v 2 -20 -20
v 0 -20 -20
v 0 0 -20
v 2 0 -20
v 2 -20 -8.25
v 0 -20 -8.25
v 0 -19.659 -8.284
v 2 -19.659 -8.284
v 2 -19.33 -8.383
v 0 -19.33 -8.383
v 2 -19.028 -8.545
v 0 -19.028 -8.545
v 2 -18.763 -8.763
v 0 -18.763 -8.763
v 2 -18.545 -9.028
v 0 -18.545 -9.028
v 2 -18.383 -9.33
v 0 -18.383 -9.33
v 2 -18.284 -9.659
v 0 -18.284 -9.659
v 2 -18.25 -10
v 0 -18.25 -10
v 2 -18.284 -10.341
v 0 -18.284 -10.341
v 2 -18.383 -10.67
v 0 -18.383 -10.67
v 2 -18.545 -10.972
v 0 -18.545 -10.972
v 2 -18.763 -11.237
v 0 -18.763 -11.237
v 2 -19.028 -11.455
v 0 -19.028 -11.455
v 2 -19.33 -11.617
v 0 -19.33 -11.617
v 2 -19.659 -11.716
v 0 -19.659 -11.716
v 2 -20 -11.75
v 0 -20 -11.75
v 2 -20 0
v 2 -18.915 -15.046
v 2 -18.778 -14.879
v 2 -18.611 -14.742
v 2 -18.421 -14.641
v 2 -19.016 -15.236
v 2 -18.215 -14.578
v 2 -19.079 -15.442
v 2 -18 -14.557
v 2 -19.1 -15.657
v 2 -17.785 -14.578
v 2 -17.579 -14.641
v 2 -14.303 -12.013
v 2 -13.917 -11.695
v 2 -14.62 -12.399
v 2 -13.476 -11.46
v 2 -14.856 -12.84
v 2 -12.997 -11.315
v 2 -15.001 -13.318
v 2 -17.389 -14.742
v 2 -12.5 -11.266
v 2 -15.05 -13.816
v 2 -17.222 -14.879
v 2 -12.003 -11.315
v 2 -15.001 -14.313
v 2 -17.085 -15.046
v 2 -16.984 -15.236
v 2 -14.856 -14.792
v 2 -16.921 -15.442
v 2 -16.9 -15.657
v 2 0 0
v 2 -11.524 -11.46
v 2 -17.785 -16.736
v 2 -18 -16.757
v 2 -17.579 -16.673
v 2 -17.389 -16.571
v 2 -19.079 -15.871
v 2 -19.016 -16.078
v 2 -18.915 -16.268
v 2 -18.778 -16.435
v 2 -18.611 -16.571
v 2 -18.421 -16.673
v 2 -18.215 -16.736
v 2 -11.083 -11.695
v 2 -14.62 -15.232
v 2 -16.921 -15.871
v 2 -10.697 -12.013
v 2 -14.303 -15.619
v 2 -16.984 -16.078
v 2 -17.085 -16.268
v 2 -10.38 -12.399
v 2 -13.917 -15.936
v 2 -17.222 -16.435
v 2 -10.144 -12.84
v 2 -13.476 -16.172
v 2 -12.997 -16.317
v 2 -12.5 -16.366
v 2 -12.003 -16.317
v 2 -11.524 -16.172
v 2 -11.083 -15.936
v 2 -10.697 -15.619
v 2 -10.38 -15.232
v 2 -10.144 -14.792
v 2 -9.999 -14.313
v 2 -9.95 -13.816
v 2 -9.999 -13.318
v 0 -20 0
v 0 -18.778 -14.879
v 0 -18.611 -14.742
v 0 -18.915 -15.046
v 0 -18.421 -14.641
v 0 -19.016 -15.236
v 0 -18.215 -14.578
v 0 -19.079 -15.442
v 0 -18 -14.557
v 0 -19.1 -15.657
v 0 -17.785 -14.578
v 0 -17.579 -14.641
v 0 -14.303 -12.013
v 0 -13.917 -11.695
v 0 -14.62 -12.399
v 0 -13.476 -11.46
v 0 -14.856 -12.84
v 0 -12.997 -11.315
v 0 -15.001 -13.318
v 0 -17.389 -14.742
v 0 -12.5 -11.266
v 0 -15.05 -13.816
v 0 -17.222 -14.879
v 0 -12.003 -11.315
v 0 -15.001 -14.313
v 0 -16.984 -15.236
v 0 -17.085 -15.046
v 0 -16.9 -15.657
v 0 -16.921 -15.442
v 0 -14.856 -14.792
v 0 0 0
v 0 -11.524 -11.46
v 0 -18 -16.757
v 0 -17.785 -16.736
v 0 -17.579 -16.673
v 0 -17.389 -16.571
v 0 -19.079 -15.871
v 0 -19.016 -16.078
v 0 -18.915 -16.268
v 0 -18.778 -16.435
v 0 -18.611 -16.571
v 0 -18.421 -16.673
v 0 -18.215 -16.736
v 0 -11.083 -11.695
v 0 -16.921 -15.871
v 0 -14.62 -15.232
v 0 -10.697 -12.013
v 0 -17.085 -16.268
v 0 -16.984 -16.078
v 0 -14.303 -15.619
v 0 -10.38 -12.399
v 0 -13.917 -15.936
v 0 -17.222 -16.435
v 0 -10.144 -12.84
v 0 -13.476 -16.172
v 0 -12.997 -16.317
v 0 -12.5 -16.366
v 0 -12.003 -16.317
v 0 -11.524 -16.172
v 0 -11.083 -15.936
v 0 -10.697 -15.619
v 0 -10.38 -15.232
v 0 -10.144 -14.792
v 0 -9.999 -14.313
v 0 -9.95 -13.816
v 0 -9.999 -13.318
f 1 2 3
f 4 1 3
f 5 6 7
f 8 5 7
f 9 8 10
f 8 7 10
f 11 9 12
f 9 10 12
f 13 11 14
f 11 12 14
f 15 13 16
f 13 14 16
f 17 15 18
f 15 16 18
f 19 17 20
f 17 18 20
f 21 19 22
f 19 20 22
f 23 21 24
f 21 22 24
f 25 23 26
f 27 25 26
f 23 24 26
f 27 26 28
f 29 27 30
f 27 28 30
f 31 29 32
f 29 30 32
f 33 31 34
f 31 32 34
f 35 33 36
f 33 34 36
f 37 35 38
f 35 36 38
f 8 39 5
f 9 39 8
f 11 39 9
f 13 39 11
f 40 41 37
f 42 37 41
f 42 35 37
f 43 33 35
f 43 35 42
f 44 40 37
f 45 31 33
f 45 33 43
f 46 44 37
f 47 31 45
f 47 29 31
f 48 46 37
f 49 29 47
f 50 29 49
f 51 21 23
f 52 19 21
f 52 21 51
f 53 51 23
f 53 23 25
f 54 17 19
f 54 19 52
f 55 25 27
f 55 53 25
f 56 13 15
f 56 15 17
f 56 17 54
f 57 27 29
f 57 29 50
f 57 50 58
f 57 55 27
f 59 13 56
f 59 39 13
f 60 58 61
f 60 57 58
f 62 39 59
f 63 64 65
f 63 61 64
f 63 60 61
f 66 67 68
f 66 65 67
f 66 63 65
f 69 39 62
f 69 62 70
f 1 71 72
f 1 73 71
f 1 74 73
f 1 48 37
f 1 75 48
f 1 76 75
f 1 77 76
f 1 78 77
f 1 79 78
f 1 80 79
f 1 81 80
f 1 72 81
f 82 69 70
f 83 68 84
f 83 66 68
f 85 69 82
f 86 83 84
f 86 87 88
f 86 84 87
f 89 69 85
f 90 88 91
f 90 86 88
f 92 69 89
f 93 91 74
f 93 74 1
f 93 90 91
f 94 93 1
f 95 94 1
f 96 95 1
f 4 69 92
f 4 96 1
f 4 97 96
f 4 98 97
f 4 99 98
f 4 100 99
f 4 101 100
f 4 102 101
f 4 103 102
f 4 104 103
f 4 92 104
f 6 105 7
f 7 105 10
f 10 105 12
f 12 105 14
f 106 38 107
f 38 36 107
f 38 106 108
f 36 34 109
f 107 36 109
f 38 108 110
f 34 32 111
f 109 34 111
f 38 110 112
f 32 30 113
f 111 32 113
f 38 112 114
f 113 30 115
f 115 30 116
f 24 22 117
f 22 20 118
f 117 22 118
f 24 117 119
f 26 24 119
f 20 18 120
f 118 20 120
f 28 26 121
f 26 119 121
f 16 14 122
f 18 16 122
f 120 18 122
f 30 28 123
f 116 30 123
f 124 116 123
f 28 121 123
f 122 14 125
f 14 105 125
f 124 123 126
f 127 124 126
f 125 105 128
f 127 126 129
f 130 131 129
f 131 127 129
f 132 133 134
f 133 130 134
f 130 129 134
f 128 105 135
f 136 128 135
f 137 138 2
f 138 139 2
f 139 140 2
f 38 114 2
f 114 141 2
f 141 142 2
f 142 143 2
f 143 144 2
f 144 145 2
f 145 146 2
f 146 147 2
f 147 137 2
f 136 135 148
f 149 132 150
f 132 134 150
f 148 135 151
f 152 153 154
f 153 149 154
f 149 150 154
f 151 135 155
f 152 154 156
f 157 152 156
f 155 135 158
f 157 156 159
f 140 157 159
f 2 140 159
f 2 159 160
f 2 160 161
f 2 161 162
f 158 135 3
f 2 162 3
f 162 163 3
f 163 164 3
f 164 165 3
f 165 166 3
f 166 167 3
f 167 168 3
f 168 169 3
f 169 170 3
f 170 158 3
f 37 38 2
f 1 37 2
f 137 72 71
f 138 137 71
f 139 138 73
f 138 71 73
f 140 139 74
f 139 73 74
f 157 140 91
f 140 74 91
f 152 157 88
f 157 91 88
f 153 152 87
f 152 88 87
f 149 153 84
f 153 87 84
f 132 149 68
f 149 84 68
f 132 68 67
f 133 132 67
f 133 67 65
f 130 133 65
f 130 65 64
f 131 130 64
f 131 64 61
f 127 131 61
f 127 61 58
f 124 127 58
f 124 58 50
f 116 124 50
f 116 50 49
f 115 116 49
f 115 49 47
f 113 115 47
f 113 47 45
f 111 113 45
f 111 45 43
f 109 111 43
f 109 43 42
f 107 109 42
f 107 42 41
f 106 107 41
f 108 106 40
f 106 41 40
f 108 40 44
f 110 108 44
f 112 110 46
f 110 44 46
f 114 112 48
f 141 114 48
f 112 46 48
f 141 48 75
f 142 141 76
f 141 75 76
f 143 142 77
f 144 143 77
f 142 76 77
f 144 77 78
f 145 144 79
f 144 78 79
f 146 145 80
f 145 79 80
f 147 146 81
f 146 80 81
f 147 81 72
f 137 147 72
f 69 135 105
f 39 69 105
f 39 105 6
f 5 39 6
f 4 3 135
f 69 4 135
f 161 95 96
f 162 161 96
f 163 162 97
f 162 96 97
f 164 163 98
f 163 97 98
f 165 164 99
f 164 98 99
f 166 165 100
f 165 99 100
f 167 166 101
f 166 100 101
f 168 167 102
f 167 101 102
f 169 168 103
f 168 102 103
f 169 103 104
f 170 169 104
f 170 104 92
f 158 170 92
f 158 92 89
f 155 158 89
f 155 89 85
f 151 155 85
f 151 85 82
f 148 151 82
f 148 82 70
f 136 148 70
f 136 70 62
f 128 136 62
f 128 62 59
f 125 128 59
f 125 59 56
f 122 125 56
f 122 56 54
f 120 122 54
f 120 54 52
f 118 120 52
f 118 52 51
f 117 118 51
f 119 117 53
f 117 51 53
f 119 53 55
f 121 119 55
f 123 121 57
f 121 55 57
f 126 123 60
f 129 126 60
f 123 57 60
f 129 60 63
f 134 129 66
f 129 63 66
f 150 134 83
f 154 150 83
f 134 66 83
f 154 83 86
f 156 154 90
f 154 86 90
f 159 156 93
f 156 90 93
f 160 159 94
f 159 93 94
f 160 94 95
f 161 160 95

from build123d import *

# Parameters (mm, degrees)
EXTRUDE_1_DEPTH     = 2
SKETCH_2_R          = 1.1
SKETCH_2_R_2        = 2.55
CUT_EXTRUDE_1_DEPTH = 29.354893758


with BuildPart() as part:
    # 草图1 → 凸台-拉伸1 (new body)
    with BuildSketch(Plane(origin=(0, 0, 0), x_dir=(0, 0, -1), z_dir=(1, 0, 0))):
        with BuildLine():
            Line((20, 0), (0, 0))
            Line((0, 0), (0, -20))
            Line((0, -20), (8.25, -20))
            ThreePointArc((8.25, -20), (10, -18.25), (11.75, -20))
            Line((11.75, -20), (20, -20))
            Line((20, -20), (20, 0))
        make_face()
    extrude(amount=EXTRUDE_1_DEPTH)

    # 草图2 → 切除-拉伸1 (cut, through all)
    with BuildSketch(Plane(origin=(2, 0, 0), x_dir=(0, 0, -1), z_dir=(1, 0, 0))):
        with Locations((15.656854249, -18)):
            Circle(SKETCH_2_R)
        with Locations((13.815658986, -12.5)):
            Circle(SKETCH_2_R_2)
    extrude(amount=-CUT_EXTRUDE_1_DEPTH, mode=Mode.SUBTRACT)


solid = part.part
